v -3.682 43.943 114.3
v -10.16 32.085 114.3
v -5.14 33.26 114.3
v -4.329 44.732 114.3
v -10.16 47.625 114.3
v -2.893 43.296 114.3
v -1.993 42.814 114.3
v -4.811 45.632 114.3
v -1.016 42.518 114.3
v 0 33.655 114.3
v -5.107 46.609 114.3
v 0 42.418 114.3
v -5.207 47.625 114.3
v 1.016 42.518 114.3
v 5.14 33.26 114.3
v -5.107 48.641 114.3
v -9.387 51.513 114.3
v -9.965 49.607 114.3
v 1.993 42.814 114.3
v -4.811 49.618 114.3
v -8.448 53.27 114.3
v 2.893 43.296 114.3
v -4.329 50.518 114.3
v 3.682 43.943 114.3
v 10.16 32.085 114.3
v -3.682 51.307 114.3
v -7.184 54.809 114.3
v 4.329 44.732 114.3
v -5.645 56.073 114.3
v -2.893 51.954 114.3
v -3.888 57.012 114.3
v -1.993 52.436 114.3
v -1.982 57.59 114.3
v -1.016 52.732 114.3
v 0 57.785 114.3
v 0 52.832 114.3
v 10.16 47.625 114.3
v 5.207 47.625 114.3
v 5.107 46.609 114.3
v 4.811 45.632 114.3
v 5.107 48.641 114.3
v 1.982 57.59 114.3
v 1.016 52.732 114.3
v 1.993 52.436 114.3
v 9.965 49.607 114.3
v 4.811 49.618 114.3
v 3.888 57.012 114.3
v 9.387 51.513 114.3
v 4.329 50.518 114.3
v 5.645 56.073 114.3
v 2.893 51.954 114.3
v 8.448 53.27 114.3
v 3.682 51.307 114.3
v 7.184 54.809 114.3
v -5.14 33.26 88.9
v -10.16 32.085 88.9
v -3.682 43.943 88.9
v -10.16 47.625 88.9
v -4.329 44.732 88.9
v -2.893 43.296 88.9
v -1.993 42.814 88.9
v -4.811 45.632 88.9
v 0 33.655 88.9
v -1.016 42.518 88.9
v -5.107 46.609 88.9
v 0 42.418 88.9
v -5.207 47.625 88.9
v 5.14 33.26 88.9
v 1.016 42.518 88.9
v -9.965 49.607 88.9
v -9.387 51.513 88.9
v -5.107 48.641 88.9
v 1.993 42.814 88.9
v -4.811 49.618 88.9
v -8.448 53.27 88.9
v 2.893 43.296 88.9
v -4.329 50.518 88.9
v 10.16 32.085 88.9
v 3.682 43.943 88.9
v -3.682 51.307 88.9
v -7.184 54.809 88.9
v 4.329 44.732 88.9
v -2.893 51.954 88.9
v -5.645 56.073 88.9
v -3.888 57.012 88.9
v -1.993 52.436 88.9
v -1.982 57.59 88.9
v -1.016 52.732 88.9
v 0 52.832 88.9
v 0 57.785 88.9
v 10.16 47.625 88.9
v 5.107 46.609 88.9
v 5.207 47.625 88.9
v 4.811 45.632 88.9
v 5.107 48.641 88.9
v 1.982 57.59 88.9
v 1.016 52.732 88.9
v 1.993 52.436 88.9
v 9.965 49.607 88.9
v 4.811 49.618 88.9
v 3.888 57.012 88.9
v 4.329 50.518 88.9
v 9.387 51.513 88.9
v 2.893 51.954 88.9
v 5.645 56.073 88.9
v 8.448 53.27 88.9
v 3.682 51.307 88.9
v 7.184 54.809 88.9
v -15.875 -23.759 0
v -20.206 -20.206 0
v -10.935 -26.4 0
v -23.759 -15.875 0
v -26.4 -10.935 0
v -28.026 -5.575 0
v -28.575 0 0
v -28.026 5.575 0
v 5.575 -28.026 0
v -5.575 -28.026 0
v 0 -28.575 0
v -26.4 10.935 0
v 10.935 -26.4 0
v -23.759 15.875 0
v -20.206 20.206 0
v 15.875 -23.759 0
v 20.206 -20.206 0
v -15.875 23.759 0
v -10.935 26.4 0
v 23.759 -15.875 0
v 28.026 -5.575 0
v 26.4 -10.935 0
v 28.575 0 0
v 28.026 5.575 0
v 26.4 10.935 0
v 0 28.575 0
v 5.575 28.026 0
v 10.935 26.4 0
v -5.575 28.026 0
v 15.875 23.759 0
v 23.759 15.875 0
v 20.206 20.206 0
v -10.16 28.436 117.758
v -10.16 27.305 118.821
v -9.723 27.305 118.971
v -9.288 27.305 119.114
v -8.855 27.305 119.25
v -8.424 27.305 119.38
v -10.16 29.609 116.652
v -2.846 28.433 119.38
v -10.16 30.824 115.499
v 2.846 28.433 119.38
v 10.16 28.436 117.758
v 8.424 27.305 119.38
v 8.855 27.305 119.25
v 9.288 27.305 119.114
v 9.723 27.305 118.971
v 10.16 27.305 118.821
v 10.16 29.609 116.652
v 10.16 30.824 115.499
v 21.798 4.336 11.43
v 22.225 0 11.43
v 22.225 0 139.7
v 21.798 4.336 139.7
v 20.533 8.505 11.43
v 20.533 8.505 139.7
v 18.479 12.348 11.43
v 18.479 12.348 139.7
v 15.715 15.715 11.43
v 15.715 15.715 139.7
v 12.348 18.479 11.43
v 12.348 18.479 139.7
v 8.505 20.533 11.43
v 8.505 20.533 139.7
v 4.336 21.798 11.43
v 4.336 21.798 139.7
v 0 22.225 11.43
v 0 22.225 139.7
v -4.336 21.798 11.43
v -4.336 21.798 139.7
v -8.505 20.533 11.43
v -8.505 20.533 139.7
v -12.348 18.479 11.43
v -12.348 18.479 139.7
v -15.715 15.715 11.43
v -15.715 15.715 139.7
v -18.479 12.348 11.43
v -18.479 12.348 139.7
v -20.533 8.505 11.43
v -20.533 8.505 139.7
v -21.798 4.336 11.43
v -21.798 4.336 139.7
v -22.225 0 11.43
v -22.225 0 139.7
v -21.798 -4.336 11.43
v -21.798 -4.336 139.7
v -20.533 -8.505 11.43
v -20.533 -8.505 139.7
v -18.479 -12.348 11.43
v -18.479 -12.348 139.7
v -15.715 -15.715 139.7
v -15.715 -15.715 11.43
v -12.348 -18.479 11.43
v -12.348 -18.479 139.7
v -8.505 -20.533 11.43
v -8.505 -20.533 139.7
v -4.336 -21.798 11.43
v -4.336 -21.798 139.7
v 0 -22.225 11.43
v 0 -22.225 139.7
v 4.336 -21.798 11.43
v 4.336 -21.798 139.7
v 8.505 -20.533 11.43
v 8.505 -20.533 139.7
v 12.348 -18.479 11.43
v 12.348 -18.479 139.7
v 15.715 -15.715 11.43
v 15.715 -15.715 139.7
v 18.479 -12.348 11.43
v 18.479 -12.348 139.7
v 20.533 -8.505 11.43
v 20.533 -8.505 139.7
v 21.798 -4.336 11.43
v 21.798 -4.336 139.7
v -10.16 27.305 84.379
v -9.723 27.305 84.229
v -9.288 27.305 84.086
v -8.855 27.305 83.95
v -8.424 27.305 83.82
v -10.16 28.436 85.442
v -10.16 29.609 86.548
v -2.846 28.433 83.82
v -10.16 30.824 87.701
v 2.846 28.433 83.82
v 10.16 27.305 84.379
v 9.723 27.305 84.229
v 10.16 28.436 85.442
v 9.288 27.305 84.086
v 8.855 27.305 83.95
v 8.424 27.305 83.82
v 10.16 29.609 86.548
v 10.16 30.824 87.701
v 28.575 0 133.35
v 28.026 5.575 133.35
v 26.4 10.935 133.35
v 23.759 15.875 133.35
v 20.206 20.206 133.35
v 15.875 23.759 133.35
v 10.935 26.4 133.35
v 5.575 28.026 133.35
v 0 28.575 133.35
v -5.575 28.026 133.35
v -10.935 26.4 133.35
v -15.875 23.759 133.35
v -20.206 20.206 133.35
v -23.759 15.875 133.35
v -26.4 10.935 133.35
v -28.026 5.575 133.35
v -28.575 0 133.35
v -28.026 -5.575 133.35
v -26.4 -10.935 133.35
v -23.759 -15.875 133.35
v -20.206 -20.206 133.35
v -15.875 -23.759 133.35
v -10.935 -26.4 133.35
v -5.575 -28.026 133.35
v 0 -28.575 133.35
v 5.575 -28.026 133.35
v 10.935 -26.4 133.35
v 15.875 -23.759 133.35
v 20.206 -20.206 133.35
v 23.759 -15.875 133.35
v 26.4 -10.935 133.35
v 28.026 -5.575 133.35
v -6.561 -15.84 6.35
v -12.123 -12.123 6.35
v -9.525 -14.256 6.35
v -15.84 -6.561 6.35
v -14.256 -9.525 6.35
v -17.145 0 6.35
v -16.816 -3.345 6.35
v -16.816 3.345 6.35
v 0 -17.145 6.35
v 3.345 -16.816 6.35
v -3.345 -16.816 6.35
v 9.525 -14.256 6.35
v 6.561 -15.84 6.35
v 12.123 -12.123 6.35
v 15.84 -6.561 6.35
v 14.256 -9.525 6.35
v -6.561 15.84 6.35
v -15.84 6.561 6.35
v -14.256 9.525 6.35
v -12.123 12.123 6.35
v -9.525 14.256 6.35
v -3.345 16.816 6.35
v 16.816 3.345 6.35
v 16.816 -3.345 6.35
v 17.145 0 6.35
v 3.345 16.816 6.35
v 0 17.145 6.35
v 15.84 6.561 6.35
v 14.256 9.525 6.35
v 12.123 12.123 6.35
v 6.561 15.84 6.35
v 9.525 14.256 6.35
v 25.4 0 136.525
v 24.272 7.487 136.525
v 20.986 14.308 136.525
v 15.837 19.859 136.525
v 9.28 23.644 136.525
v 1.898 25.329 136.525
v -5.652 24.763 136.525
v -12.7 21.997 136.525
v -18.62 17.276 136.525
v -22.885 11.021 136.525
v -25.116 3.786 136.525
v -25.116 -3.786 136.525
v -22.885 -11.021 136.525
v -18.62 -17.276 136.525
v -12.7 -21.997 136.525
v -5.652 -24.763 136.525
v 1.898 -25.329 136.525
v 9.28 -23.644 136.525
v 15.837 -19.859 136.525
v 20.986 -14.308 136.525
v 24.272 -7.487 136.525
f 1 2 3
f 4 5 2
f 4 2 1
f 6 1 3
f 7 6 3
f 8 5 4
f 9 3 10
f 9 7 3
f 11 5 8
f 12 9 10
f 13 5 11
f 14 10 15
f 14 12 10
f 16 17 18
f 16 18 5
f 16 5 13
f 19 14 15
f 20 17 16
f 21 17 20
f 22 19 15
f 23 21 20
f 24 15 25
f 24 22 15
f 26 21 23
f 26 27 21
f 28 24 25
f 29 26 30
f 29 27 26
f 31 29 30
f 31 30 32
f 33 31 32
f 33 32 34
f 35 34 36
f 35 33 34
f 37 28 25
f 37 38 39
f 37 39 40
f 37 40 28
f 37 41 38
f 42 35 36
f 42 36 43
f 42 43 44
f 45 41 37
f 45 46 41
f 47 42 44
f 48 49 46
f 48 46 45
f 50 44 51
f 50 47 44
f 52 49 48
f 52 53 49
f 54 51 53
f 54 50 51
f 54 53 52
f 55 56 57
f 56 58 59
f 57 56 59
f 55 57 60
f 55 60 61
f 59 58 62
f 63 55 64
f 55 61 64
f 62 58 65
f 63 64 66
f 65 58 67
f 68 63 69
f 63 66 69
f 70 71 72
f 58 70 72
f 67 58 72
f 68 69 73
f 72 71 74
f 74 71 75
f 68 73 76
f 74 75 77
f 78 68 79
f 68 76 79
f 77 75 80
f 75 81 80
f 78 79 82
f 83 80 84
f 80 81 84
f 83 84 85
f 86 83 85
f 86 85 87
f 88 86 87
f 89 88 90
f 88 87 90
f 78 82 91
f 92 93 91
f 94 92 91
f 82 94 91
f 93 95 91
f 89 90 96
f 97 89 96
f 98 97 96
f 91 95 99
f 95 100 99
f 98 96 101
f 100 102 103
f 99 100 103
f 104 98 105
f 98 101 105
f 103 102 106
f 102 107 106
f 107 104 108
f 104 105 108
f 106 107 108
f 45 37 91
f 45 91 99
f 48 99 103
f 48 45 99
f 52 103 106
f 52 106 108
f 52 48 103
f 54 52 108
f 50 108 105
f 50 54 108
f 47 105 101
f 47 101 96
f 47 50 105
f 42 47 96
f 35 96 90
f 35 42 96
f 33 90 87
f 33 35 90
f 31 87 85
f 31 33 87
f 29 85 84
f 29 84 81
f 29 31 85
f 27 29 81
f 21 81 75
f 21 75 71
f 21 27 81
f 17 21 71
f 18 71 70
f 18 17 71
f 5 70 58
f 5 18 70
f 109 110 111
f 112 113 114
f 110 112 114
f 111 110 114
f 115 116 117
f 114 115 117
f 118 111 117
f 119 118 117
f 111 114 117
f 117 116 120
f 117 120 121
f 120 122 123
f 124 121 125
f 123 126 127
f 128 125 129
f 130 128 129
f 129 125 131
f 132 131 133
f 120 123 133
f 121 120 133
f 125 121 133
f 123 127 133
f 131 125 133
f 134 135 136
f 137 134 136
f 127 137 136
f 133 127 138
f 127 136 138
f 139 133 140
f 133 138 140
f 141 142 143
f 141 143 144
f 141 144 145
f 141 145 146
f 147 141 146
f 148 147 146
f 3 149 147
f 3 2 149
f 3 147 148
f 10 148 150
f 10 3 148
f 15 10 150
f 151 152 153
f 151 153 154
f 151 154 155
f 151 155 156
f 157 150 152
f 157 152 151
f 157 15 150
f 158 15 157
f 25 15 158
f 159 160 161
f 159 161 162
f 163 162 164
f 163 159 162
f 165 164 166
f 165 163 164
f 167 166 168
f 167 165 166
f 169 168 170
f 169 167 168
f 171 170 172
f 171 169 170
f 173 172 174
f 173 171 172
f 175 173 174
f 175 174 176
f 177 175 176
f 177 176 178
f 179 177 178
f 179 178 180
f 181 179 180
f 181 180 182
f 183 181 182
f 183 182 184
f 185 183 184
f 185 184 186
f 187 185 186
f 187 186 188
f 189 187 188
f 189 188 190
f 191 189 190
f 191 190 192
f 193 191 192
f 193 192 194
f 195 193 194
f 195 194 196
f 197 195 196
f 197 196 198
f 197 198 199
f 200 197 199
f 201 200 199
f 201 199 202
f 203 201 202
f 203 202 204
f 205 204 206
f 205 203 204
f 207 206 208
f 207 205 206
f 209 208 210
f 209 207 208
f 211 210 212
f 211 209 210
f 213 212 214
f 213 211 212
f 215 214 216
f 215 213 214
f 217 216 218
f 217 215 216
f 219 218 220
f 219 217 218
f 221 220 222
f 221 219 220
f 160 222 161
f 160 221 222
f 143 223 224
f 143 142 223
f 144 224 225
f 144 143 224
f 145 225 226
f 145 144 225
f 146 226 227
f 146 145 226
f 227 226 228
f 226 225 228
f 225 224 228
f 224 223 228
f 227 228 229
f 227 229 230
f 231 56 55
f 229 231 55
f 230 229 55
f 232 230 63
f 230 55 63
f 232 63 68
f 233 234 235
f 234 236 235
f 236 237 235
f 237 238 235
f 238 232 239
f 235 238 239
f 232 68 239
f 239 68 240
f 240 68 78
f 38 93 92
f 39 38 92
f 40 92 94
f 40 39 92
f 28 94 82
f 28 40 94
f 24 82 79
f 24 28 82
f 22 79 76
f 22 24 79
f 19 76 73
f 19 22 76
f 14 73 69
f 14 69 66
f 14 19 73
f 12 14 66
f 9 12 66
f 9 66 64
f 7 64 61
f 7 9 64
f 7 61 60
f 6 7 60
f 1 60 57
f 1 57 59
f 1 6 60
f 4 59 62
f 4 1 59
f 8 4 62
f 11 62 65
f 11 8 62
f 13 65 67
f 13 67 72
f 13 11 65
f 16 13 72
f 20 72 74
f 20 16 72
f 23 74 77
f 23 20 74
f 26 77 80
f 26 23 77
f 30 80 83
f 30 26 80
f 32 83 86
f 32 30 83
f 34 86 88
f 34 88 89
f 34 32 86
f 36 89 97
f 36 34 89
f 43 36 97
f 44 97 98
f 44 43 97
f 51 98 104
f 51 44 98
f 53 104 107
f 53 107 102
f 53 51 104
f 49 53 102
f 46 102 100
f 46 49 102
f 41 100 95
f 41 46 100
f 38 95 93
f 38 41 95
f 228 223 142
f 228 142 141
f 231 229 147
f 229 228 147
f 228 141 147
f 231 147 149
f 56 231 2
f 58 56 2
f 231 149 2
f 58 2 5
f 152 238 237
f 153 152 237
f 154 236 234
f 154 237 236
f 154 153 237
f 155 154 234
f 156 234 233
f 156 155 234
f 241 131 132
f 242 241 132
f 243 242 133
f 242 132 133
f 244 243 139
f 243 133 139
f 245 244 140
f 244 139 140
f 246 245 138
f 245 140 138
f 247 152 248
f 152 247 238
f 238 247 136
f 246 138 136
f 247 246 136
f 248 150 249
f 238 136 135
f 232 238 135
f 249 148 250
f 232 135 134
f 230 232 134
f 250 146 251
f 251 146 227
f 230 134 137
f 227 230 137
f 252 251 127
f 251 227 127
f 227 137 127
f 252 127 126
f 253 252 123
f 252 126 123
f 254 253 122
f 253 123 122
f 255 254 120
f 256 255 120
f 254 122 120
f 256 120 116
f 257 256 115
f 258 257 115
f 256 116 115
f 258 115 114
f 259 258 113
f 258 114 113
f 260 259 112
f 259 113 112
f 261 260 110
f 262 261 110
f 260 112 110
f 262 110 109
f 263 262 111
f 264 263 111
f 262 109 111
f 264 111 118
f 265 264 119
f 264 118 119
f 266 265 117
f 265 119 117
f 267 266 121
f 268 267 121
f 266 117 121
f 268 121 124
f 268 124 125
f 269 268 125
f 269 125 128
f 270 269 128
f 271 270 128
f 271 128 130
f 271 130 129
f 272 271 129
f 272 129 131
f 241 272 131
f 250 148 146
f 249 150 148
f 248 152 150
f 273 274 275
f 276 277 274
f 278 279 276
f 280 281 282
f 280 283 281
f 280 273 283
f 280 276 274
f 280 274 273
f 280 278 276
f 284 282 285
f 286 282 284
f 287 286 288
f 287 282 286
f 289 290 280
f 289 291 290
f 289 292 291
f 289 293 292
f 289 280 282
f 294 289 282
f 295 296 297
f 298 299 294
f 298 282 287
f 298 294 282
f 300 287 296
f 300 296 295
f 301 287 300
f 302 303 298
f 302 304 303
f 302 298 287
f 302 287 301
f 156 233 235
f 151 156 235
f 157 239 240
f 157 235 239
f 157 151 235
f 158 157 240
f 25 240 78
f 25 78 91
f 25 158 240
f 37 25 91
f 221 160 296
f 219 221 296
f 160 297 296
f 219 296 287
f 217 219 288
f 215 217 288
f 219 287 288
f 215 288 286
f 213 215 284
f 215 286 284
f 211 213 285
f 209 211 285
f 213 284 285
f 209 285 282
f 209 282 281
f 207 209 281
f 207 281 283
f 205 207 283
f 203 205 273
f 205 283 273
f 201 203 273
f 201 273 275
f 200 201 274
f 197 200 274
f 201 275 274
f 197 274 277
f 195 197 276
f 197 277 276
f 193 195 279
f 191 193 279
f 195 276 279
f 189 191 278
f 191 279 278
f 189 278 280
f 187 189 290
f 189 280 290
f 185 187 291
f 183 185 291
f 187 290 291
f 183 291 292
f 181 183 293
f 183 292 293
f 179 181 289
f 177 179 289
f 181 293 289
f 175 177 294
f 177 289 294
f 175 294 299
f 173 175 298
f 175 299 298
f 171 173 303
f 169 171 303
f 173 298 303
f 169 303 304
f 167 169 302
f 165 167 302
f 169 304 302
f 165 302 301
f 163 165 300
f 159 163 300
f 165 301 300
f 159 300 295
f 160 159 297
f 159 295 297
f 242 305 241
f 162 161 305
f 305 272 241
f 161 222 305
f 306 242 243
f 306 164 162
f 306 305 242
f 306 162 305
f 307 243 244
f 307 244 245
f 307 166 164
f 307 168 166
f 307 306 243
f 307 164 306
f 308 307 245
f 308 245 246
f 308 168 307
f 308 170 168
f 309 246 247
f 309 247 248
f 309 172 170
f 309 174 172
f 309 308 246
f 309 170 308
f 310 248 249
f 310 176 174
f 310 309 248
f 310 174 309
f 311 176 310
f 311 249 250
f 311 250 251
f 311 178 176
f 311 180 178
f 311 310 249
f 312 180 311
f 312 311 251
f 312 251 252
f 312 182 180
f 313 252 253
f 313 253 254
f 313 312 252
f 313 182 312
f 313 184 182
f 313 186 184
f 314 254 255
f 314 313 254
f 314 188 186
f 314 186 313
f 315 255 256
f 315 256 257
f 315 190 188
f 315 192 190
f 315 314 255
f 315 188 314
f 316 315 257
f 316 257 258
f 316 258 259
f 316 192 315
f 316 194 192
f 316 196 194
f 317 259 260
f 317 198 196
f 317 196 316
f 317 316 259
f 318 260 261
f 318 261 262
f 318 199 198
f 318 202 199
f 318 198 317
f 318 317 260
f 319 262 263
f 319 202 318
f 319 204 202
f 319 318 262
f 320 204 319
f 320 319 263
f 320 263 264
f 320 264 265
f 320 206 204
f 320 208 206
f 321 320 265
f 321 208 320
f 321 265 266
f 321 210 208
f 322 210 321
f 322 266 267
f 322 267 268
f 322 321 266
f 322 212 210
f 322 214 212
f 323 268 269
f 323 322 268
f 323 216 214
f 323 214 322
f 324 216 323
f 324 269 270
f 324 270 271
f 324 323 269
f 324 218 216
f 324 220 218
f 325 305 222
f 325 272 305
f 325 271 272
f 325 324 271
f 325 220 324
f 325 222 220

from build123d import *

# Parameters (mm, degrees)
F0_R         = 28.575
F1_DEPTH     = 139.7
F2_T         = -6.35
F5_DEPTH     = 25.4
F7_SIZE      = 6.34999
F8_T4_ANGLE  = 86.6853703019
F8_T11_ANGLE = 86.6853703019


# Not quite as in the source:
# - a fillet or chamfer that OpenCascade refuses, or shapes differently, is made with other operations: its cross-section is extruded or revolved along the edge and cut away or added
# - two fillets or chamfers of one size are made in one step
# - a fillet or chamfer is up to 0.001 mm smaller than in the source, because OpenCascade refuses the exact size


with BuildPart() as f1:
    # F0 (on Top) → F1 (new body)
    with BuildSketch(Plane.XY):
        Circle(F0_R)
    extrude(amount=F1_DEPTH)

    # F2
    f2_openings = [f1.faces().sort_by_distance(p)[0] for p in [
        (0, 0, 139.7),
    ]]
    offset(amount=F2_T, openings=f2_openings)

    # F4 (on offset) → F5 (join)
    with BuildSketch(Plane.XY.offset(114.3)):
        with BuildLine():
            ThreePointArc((10.16, 47.625), (0, 57.785), (-10.16, 47.625))
            ThreePointArc((-10.16, 47.625), (0, 37.465), (10.16, 47.625))
        make_face()
        with BuildLine():
            ThreePointArc((-5.207, 47.625), (0, 52.832), (5.207, 47.625))
            ThreePointArc((5.207, 47.625), (0, 42.418), (-5.207, 47.625))
        make_face(mode=Mode.SUBTRACT)
        with BuildLine():
            ThreePointArc((10.16, 47.625), (0, 37.465), (-10.16, 47.625))
            Line((-10.16, 47.625), (-10.16, 27.305))
            Line((-10.16, 27.305), (10.16, 27.305))
            Line((10.16, 27.305), (10.16, 47.625))
        make_face()
    extrude(amount=-F5_DEPTH)

    # F6: union 

    # F7 (size 6.35 in the source; OpenCascade refuses exactly that, so slightly less here)
    f7_edges = [f1.edges().sort_by_distance(p)[0] for p in [
        (-28.575, 0, 139.7),
    ]]
    chamfer(f7_edges, length=F7_SIZE)

    # F8: chamfer of 5.08 on 3 edges, made by hand


with BuildPart() as f8_tool2:
    # F8_s3 → F8_t4 (revolve)
    with BuildSketch(Plane(origin=(0, 0, 0), x_dir=(0, 0, 1), z_dir=(-0.7272616235, -0.6863603507, 0))):
        Polygon((119.38, 28.575), (114.3, 33.655), (114.3, 28.575), align=None)
    revolve(axis=Axis((0, 0, 114.3), (0, 0, -1)), revolution_arc=F8_T4_ANGLE)

    split(bisect_by=Plane.XZ.offset(-27.305), keep=Keep.BOTTOM)

    split(bisect_by=Plane.YZ.offset(10.16), keep=Keep.BOTTOM)

    split(bisect_by=Plane.YZ.offset(-10.16), keep=Keep.TOP)


with BuildPart() as f1_1:
    add(f1.part)

    # F8_t1: union F8_tool2
    add(f8_tool2.part)


with BuildPart() as f8_tool9:
    # F8_s10 → F8_t11 (revolve)
    with BuildSketch(Plane(origin=(0, 0, 0), x_dir=(0, 0, 1), z_dir=(-0.7272616235, -0.6863603507, 0))):
        Polygon((83.82, 28.575), (88.9, 33.655), (88.9, 28.575), align=None)
    revolve(axis=Axis((0, 0, 88.9), (0, 0, -1)), revolution_arc=F8_T11_ANGLE)

    split(bisect_by=Plane.XZ.offset(-27.305), keep=Keep.BOTTOM)

    split(bisect_by=Plane.YZ.offset(10.16), keep=Keep.BOTTOM)

    split(bisect_by=Plane.YZ.offset(-10.16), keep=Keep.TOP)


with BuildPart() as f1_2:
    add(f1_1.part)

    # F8_t8: union F8_tool9
    add(f8_tool9.part)

    # F8_s15 → F8_t16 (revolve)
    with BuildSketch(Plane.XZ):
        Polygon((22.225, 11.43), (17.145, 6.35), (22.225, 6.35), align=None)
    revolve(axis=Axis((0, 0, 6.35), (0, 0, -1)))


solid = f1_2.part
